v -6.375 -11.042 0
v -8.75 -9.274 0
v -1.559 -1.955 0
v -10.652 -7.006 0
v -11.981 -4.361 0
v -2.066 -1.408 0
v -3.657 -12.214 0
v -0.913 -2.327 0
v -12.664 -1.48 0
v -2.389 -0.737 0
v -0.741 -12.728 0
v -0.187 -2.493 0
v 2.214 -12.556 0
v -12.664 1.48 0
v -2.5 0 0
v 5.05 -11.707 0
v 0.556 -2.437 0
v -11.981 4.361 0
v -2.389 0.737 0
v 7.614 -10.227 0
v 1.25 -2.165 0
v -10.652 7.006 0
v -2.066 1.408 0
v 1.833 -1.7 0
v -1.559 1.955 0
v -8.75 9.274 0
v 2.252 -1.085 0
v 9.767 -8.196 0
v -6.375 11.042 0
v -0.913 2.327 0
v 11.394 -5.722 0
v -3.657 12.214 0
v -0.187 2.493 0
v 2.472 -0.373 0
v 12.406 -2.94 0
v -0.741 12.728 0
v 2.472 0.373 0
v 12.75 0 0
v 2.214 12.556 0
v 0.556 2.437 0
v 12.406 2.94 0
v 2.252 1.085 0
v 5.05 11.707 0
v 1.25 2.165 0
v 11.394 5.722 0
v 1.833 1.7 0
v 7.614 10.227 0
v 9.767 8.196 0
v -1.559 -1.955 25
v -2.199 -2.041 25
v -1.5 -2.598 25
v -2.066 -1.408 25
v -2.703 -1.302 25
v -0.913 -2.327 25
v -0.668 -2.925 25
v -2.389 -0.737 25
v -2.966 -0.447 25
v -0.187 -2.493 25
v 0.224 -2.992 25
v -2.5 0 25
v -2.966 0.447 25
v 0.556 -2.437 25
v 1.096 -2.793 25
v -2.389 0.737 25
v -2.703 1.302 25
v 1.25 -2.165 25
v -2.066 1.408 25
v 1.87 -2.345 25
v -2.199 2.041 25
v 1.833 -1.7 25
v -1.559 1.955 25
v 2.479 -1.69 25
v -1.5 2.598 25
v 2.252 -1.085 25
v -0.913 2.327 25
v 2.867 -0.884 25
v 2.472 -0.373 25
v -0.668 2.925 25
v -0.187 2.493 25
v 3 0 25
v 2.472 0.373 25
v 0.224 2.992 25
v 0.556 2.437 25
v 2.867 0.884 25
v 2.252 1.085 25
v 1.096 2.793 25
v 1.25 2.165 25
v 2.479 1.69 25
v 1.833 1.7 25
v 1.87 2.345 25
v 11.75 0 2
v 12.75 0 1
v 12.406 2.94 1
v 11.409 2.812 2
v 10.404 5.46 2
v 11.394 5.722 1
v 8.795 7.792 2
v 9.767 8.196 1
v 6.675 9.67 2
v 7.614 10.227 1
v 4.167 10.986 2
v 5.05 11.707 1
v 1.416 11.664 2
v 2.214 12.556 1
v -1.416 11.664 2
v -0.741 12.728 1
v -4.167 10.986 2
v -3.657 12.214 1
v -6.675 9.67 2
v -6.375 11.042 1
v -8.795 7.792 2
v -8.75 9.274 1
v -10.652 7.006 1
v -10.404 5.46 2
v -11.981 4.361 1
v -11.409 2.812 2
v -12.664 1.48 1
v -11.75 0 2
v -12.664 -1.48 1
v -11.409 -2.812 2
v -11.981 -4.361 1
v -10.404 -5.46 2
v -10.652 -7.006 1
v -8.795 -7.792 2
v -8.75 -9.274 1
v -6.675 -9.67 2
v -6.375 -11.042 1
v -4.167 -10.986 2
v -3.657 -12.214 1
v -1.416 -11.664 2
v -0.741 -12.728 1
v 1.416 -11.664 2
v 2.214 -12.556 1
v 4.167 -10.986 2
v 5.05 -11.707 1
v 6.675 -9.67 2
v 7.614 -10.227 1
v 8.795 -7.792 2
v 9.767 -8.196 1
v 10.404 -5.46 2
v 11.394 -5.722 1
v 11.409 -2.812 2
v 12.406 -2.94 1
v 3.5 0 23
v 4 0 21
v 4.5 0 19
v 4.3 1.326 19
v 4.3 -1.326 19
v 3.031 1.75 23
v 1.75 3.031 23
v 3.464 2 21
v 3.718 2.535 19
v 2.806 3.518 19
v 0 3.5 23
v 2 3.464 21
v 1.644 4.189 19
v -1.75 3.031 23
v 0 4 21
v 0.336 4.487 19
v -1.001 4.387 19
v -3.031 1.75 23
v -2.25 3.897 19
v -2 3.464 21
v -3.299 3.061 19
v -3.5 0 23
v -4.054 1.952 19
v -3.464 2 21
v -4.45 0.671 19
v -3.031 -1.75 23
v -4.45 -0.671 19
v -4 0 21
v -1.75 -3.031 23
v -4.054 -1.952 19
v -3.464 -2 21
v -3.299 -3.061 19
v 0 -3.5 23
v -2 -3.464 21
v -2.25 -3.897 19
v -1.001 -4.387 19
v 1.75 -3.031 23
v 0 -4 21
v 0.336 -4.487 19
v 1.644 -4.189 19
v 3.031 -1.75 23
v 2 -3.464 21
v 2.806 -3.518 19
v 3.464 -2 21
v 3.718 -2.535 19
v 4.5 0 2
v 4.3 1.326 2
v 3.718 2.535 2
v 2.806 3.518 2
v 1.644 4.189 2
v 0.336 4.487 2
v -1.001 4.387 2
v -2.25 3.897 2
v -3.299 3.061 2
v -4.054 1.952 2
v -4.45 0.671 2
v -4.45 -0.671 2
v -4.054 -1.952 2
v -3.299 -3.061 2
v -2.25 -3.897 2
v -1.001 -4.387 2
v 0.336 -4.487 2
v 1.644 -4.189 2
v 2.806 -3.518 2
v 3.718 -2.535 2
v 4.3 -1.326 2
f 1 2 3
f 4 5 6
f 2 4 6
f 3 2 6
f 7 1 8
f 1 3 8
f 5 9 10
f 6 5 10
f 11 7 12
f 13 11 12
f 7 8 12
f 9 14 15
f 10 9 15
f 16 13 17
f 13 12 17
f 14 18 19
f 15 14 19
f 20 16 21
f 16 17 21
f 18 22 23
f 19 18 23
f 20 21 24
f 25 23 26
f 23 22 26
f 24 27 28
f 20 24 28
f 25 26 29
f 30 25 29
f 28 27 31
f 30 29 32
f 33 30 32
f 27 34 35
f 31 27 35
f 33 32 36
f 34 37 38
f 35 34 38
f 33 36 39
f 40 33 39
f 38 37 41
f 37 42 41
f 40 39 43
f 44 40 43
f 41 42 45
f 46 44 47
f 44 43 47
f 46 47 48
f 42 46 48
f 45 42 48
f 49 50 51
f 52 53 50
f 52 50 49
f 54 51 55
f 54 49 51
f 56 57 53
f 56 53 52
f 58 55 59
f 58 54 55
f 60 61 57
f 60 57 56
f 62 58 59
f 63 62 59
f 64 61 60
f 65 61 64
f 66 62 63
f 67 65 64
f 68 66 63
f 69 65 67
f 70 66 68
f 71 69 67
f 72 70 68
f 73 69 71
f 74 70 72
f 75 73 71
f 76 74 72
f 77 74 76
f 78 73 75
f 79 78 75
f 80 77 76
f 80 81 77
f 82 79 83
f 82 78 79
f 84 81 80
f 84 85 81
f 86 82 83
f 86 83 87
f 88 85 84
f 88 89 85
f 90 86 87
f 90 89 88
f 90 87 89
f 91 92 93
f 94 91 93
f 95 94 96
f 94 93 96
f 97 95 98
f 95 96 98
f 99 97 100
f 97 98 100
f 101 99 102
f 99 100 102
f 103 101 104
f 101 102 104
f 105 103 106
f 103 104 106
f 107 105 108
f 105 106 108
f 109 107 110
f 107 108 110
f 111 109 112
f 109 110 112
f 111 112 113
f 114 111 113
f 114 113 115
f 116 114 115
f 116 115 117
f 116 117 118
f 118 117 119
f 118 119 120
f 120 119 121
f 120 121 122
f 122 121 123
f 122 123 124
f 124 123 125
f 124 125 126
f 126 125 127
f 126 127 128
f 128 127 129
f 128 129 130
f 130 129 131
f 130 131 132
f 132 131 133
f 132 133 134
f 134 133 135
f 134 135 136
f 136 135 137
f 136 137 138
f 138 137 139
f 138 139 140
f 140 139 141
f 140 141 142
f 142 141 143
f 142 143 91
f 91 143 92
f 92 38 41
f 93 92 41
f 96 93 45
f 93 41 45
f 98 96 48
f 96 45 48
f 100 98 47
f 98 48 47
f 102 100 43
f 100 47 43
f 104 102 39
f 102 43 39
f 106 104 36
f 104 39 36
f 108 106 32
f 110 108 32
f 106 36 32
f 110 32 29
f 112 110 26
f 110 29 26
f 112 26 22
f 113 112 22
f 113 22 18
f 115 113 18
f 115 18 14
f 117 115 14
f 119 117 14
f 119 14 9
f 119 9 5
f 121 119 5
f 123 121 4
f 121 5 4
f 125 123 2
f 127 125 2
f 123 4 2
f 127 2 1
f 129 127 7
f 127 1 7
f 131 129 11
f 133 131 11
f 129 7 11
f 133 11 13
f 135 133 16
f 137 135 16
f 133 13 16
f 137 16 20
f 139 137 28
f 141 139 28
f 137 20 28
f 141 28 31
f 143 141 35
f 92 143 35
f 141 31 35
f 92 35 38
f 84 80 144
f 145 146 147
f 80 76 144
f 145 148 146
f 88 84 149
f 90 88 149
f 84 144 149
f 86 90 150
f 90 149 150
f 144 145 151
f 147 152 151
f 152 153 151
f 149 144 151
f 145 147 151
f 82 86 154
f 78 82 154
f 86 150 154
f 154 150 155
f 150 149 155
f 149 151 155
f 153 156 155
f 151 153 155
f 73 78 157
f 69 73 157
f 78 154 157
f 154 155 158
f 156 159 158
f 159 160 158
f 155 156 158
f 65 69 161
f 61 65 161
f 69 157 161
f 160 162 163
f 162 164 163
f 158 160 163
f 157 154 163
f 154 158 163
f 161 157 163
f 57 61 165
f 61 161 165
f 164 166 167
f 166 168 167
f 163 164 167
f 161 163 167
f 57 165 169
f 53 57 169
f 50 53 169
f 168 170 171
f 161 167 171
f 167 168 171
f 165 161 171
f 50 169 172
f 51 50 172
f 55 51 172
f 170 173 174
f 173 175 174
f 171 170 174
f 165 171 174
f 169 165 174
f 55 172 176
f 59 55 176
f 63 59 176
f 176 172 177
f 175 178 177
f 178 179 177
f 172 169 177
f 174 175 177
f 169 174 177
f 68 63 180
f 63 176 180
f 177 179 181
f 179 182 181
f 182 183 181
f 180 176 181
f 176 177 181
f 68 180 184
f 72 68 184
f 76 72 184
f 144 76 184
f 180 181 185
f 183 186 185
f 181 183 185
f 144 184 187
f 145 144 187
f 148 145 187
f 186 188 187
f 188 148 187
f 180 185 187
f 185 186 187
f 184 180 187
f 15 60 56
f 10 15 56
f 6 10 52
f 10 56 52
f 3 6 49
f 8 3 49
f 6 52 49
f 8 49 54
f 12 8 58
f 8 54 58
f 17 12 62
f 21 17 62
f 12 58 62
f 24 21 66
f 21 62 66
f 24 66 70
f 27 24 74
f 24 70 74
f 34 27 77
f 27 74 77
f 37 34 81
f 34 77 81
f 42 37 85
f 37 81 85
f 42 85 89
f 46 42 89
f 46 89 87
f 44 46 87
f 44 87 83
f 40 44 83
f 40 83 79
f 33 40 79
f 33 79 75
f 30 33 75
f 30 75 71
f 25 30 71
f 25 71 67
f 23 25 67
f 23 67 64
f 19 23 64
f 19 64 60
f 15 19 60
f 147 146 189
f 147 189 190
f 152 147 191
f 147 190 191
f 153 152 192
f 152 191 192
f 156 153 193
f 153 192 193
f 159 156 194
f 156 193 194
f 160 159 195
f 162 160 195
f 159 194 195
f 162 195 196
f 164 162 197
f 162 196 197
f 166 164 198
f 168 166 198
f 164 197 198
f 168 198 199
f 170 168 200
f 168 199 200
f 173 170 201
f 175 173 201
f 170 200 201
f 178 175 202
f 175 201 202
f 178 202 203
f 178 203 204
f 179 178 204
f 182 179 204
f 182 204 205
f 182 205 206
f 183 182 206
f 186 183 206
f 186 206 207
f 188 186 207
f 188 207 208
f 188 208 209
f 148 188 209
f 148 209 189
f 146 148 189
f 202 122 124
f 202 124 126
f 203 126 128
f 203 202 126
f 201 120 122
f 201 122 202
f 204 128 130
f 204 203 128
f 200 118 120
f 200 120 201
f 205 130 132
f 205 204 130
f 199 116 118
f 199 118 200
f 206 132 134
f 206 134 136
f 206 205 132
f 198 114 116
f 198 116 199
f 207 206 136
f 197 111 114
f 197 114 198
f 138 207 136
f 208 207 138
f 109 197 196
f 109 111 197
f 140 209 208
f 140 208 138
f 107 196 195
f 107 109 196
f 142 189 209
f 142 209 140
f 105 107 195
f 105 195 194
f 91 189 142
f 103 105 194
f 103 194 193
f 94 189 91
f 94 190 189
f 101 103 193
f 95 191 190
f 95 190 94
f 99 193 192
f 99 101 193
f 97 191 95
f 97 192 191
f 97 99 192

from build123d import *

# Parameters (mm, degrees)
F0_R     = 4.5
F1_DEPTH = 25
F0_R_2   = 12.75
F2_DEPTH = 2
F3_SIZE2 = 6
F3_SIZE  = 1.5
F4_D     = 5
F5_SIZE2 = 1
F5_SIZE  = 1


with BuildPart() as f1:
    # F0 (on Top) → F1 (new body)
    with BuildSketch(Plane.XY):
        Circle(F0_R)
    extrude(amount=F1_DEPTH)

    # F0 (on Top) → F2 (join)
    with BuildSketch(Plane.XY):
        Circle(F0_R_2)
        Circle(F0_R, mode=Mode.SUBTRACT)
    extrude(amount=F2_DEPTH)

    # F3
    f3_edges = [f1.edges().sort_by_distance(p)[0] for p in [
        (-4.5, 0, 25),
    ]]
    f3_side = f1.faces().sort_by_distance((0, 0, 25))[0]
    chamfer(f3_edges, length=F3_SIZE, length2=F3_SIZE2, reference=f3_side)

    # F4 (through all)
    with Locations(Plane(origin=(0, 0, 0), x_dir=(1, 0, 0), z_dir=(0, 0, -1))):
        with Locations((0, 0)):
            Hole(F4_D / 2)

    # F5
    f5_edges = [f1.edges().sort_by_distance(p)[0] for p in [
        (-12.75, 0, 2),
    ]]
    chamfer(f5_edges, length=F5_SIZE, length2=F5_SIZE2)


solid = f1.part
